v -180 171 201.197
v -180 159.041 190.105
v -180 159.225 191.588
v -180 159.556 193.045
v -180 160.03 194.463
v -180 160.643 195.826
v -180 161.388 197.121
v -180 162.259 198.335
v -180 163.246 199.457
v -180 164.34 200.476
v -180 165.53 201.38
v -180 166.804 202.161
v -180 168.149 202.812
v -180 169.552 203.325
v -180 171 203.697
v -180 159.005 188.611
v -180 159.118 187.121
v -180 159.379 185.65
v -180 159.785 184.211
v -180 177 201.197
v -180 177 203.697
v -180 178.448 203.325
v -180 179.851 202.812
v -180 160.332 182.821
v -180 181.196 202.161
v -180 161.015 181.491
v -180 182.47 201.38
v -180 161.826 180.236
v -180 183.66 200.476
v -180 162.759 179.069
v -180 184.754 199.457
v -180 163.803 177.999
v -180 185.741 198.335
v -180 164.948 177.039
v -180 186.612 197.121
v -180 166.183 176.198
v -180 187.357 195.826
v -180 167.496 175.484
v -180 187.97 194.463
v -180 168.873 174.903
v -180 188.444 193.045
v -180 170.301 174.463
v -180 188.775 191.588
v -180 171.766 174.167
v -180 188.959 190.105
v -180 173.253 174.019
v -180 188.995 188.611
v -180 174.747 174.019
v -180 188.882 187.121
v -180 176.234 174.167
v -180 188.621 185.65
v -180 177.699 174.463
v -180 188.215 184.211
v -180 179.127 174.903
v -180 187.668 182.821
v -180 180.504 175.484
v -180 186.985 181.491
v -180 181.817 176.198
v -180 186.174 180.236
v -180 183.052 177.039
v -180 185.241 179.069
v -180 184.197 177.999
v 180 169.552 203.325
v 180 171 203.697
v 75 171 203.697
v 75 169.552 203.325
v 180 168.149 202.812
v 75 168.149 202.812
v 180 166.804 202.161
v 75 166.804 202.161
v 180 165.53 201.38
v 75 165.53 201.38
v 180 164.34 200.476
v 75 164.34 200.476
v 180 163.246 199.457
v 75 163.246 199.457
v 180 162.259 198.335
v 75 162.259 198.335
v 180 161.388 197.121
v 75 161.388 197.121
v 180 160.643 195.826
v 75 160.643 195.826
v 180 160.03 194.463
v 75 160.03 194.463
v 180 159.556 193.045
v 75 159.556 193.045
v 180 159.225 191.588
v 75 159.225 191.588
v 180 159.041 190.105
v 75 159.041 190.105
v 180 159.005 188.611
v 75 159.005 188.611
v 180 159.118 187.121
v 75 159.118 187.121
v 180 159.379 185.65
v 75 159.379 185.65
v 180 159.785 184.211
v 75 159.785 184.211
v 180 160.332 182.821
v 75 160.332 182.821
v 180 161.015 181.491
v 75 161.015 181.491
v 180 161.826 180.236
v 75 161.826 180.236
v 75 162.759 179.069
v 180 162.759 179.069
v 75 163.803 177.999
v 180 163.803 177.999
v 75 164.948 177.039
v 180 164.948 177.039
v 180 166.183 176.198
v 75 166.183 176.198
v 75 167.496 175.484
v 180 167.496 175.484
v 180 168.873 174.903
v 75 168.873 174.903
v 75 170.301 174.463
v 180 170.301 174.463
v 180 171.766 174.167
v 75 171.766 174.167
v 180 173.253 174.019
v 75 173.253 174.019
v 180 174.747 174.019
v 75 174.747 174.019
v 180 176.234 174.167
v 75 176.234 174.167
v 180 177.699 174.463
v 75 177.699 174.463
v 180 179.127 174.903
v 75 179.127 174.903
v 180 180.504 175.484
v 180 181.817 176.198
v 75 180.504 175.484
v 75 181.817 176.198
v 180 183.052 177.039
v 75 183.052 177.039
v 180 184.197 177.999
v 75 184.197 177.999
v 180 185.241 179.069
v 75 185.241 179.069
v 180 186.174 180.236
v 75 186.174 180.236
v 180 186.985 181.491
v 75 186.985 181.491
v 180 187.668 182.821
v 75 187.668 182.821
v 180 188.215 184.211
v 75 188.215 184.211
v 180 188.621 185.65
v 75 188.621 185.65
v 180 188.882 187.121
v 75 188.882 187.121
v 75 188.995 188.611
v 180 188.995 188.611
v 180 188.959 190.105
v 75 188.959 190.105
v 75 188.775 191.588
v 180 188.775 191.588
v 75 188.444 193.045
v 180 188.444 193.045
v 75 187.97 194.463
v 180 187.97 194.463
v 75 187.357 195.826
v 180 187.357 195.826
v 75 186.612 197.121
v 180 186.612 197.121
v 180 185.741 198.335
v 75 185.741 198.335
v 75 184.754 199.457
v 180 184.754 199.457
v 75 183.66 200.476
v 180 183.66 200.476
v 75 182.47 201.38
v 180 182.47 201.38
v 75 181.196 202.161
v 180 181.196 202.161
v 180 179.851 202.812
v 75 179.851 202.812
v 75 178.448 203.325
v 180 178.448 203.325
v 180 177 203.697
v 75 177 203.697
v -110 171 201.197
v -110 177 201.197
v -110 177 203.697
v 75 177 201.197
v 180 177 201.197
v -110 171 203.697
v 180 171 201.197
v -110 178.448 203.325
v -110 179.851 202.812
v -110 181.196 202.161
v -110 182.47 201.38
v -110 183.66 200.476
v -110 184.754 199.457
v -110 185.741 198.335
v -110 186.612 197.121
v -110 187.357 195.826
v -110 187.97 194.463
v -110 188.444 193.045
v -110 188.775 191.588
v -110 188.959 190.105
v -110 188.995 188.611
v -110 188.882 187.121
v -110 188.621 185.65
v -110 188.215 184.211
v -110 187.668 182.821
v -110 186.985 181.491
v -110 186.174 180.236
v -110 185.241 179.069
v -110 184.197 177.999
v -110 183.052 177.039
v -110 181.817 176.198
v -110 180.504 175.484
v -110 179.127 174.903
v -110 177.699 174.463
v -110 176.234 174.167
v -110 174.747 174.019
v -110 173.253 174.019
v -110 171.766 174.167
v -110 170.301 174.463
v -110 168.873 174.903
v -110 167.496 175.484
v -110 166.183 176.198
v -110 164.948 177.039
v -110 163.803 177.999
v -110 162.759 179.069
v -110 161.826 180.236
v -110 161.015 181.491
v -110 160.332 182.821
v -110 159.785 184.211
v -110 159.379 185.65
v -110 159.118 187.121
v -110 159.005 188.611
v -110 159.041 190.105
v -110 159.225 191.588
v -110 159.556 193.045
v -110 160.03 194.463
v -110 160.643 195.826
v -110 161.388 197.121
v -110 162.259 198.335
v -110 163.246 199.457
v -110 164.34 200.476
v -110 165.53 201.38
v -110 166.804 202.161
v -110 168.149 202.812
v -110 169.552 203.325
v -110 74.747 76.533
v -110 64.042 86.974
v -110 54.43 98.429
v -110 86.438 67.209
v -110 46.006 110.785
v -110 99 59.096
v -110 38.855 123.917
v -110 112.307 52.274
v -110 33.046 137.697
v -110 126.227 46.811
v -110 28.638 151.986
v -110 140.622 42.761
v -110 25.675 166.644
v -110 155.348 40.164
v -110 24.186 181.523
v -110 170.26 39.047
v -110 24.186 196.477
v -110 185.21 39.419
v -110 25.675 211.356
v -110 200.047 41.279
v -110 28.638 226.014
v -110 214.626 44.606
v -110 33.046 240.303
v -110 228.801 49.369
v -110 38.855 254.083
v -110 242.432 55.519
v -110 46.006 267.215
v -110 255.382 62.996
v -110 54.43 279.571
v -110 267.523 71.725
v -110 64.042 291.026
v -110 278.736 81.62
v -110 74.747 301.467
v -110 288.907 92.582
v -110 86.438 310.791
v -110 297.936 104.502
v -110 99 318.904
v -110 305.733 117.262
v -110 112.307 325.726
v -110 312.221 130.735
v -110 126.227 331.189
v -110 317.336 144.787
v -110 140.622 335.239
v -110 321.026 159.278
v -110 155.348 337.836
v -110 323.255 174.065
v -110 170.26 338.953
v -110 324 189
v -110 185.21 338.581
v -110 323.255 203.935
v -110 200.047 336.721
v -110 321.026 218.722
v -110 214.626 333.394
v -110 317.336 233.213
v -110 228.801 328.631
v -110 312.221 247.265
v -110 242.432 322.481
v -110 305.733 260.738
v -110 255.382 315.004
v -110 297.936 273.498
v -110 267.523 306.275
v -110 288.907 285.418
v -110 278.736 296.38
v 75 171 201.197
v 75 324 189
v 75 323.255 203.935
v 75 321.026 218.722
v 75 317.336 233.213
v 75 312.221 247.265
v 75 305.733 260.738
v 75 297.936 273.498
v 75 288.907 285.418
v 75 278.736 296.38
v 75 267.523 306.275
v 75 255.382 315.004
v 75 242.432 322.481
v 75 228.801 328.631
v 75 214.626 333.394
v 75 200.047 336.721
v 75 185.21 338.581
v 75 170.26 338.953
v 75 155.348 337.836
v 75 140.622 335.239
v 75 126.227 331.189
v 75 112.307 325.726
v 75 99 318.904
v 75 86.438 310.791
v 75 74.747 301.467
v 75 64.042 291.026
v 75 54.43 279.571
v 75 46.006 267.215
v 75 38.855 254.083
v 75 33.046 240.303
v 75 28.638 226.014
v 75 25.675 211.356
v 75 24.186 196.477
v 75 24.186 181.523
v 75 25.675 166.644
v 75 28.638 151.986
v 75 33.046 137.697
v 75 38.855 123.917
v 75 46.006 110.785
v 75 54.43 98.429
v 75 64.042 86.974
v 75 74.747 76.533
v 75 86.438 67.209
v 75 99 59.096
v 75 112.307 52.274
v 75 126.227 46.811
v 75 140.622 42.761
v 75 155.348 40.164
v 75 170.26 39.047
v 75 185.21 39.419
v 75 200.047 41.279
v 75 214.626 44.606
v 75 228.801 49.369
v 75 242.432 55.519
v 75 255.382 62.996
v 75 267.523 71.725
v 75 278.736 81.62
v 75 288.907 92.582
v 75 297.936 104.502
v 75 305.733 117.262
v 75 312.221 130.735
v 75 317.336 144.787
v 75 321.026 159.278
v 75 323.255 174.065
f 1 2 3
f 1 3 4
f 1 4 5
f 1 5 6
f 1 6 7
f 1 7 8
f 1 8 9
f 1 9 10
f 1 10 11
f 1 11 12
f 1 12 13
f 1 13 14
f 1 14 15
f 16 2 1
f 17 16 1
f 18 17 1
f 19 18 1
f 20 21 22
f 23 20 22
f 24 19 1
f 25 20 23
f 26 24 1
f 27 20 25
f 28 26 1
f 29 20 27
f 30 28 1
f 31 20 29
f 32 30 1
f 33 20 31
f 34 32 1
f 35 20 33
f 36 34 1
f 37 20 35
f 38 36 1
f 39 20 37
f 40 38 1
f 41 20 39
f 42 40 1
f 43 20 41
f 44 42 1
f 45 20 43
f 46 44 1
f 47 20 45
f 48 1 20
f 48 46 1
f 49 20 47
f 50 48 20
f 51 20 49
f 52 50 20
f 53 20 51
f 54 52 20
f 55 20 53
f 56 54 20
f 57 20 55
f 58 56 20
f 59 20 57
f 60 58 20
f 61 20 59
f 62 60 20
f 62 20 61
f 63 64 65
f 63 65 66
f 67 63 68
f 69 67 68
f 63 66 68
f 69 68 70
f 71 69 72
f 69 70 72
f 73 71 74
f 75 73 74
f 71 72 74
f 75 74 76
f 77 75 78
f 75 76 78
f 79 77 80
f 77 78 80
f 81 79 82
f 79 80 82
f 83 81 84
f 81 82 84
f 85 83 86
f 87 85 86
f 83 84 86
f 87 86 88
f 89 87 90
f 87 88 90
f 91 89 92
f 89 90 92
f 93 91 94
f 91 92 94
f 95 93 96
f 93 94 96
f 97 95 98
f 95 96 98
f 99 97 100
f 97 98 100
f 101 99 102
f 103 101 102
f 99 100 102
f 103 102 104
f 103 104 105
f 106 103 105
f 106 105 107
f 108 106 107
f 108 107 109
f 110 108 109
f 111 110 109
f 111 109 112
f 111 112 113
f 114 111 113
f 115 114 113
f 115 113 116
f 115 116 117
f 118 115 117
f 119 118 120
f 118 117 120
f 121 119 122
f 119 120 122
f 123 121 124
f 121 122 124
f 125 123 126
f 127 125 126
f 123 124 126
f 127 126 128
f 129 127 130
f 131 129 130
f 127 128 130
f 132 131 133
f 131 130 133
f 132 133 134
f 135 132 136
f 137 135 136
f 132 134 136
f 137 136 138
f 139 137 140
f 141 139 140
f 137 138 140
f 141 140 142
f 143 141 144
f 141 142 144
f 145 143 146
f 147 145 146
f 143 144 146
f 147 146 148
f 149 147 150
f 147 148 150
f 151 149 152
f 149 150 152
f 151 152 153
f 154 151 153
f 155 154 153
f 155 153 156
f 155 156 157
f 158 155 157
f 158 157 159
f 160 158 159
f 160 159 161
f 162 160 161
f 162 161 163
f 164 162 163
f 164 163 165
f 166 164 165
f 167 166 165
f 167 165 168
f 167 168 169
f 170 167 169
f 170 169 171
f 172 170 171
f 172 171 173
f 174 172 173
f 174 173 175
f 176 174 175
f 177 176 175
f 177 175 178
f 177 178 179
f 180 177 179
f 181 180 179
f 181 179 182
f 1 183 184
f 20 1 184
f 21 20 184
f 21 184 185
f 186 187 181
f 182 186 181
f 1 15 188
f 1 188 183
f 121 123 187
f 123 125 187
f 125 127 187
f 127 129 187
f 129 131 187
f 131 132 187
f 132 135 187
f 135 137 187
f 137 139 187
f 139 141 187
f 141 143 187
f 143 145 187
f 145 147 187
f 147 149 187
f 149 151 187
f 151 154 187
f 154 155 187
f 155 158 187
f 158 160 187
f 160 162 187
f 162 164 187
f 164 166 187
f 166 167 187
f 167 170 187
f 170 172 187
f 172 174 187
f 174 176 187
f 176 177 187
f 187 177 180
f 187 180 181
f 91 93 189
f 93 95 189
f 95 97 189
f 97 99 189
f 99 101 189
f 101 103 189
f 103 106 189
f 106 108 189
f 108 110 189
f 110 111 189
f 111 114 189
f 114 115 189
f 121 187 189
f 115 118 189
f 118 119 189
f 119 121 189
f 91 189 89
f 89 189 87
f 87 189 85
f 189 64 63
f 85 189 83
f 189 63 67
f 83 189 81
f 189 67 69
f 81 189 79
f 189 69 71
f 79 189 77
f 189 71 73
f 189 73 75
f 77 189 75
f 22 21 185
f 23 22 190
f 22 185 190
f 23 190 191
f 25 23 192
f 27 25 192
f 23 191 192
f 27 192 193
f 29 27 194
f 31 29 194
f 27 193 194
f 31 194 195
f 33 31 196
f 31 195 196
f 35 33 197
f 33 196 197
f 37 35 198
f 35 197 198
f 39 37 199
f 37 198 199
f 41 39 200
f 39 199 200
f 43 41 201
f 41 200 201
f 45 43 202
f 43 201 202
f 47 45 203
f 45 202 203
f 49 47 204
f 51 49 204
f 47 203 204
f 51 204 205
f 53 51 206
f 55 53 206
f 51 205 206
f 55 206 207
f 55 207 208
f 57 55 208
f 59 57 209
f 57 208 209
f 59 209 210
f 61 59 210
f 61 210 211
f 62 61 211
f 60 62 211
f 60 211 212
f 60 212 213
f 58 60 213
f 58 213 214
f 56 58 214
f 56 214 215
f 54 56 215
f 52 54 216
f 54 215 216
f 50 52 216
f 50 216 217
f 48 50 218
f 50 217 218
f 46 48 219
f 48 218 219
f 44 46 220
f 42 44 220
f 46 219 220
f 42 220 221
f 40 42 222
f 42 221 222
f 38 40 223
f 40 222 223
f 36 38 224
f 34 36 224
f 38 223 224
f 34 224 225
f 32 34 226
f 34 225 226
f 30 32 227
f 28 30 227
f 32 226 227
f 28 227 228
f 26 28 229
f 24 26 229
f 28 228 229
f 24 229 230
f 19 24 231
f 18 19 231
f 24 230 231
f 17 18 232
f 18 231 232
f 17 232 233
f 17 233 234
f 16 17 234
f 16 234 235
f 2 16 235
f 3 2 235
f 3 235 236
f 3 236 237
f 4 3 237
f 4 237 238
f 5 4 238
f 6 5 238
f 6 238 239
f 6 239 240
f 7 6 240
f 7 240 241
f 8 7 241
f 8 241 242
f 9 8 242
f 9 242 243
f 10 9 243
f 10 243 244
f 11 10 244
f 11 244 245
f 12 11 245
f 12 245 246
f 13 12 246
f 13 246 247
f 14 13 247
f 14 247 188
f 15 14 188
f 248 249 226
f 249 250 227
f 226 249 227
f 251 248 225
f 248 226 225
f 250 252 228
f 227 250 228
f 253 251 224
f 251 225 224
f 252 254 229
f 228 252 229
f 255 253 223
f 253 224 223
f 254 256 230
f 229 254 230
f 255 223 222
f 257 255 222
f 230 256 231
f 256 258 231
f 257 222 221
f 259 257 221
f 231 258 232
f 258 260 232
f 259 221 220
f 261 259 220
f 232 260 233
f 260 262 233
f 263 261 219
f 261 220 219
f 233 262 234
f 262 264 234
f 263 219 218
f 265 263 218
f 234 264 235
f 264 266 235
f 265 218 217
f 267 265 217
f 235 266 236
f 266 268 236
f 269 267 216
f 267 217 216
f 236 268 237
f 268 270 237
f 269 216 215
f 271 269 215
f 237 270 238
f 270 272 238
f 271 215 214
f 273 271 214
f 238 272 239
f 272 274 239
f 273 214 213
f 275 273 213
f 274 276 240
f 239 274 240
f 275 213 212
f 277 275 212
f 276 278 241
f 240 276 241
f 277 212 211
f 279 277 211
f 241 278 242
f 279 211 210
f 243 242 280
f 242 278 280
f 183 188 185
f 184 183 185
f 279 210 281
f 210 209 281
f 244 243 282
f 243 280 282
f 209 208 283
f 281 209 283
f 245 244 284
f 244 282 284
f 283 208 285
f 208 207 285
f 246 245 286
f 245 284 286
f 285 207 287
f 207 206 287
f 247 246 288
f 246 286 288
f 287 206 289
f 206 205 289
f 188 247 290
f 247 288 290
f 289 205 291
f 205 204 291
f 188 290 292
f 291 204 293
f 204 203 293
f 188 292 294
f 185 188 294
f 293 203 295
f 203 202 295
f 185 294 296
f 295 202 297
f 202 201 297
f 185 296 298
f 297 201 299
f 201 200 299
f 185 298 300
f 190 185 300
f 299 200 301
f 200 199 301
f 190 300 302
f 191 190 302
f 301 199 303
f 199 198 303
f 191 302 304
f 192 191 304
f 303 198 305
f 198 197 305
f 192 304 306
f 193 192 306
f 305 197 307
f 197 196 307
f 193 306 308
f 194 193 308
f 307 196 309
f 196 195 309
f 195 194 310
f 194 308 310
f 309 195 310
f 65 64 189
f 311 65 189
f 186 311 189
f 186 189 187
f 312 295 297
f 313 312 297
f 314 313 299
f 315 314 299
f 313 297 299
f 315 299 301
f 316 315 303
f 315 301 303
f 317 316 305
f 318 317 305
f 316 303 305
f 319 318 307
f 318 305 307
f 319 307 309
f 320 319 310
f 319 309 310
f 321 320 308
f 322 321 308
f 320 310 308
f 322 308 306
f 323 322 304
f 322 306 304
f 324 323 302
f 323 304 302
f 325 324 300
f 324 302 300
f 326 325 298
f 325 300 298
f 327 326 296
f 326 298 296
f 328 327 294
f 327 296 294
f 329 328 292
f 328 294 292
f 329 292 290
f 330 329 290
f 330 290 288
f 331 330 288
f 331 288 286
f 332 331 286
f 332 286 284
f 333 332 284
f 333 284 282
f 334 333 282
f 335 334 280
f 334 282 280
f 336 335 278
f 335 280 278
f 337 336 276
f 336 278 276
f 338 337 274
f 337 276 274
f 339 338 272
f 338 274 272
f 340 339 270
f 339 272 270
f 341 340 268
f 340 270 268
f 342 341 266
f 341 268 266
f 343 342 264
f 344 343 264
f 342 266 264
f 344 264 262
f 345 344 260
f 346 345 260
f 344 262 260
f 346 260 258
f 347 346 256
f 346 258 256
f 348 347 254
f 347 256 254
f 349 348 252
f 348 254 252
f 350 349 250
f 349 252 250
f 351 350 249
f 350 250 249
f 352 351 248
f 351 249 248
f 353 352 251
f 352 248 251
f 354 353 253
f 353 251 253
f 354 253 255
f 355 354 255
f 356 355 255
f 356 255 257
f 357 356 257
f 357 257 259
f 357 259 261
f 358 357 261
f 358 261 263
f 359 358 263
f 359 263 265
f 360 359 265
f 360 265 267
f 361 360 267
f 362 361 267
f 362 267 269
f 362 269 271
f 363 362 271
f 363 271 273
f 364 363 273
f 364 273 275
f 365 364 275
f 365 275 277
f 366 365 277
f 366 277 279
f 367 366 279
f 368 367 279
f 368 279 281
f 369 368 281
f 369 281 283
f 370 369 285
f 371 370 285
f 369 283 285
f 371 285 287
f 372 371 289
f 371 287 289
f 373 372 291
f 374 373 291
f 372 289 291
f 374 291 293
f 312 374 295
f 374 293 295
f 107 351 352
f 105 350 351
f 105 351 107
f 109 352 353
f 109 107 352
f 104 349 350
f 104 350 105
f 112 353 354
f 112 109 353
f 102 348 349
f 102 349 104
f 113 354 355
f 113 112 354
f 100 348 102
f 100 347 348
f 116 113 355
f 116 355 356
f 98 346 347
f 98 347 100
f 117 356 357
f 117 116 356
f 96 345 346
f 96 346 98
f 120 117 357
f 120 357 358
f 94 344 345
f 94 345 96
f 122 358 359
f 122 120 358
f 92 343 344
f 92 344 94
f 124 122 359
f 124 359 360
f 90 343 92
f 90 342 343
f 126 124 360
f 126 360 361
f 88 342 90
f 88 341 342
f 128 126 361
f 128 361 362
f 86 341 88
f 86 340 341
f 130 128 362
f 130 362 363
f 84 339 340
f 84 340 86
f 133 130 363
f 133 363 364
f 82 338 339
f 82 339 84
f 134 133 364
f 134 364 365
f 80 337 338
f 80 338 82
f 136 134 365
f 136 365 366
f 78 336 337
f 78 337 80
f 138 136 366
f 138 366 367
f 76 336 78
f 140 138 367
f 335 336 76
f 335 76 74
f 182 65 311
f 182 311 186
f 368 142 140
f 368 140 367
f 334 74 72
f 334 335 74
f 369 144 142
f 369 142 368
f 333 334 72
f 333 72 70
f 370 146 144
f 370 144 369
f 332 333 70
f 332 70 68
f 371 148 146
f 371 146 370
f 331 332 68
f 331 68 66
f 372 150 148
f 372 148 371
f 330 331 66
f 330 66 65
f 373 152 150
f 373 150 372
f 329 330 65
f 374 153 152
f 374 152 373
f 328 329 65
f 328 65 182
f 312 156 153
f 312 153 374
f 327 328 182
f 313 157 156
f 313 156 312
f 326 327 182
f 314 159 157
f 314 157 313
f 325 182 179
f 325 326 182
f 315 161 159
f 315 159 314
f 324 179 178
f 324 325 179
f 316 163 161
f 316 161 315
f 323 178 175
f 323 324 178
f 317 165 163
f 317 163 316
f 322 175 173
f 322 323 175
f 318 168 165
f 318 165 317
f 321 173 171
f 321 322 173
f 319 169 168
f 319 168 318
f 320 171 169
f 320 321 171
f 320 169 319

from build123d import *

# Parameters (mm, degrees)
SKETCH002_R  = 150
PAD002_DEPTH = 185
PAD003_DEPTH = 105
PAD004_DEPTH = 70


with BuildPart() as part:
    # Sketch002 → Pad002 (new body)
    with BuildSketch(Plane.YZ):
        Circle(SKETCH002_R)
    extrude(amount=PAD002_DEPTH)

    # Sketch003 (on Face3 of Pad002) → Pad003 (join)
    with BuildSketch(Plane.YZ.offset(185)):
        with BuildLine():
            Line((-3, 14.696938), (-3, 12.196938))
            Line((-3, 12.196938), (3, 12.196938))
            Line((3, 12.196938), (3, 14.696938))
            ThreePointArc((-3, 14.696938), (0, -15), (3, 14.696938))
        make_face()
    extrude(amount=PAD003_DEPTH)

    # Sketch004 (on Face2 of Pad003) → Pad004 (join)
    with BuildSketch(Plane(origin=(0, 0, 0), x_dir=(0, 1, 0), z_dir=(-1, 0, 0))):
        with BuildLine():
            Line((-3, -14.696938), (-3, -12.196938))
            Line((-3, -12.196938), (3, -12.196938))
            Line((3, -12.196938), (3, -14.696938))
            ThreePointArc((3, -14.696938), (0, 15), (-3, -14.696938))
        make_face()
    extrude(amount=PAD004_DEPTH)


with BuildPart() as part_1:
    # Body001 placement: moved
    add(part.part.moved(Location((-110, 174, 189))))


solid = part_1.part
